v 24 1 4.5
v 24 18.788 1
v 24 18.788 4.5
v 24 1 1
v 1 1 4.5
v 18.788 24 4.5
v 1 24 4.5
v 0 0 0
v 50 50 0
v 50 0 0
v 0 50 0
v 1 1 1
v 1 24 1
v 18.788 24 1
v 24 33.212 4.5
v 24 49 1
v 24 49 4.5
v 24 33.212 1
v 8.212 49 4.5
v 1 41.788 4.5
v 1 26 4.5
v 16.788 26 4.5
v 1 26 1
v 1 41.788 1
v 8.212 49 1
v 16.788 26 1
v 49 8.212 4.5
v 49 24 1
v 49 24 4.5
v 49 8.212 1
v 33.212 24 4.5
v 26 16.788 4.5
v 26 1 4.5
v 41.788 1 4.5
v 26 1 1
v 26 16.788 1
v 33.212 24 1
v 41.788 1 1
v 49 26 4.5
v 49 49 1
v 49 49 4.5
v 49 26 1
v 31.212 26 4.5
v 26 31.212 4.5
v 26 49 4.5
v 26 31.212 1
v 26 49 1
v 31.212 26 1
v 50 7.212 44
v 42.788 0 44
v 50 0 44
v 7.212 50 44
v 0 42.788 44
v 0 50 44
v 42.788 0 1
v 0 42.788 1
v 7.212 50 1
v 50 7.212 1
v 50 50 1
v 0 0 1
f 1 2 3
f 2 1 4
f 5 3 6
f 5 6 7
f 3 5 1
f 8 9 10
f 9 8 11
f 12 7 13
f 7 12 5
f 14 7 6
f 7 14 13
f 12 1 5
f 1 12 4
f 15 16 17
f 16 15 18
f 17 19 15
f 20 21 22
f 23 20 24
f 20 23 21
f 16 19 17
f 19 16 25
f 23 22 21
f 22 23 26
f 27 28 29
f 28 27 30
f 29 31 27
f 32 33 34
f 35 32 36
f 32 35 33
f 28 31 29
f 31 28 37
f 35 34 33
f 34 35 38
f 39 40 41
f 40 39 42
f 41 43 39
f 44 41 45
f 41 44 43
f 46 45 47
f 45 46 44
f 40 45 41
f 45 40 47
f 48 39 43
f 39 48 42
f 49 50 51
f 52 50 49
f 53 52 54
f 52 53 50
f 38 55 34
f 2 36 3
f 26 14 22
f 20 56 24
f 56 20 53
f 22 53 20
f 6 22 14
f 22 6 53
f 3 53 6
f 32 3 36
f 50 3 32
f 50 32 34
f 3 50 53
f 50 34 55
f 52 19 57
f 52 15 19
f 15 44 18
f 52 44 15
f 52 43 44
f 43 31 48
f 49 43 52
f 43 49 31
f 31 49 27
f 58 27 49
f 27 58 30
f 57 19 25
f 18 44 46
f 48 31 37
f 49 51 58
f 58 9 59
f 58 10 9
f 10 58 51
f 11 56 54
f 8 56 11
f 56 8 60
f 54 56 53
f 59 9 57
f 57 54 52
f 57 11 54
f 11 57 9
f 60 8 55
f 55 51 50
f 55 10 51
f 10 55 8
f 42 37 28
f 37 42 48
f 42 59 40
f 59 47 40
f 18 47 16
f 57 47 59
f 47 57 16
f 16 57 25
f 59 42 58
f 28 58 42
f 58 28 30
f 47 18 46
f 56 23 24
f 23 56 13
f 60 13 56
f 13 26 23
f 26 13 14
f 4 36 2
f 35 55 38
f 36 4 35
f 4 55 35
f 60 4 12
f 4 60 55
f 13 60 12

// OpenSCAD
_basis = 25;

module diagonal_square(x=2, h=2) {
    color("LightGray") {
        for (i = [0:x-1]) {
            for (j = [0:x-1]) {
                translate([_basis*i+1,_basis*j+1,0]) cube([23,23,4.5]);
            }
        }
    }

    color("Grey") {
        cube([_basis*x,_basis*x,1]);
        intersection() {
            translate([_basis*x+sqrt(10.2*10.2*2)/2,0,0]) rotate([0,0,90+45]) cube([80,10.2,_basis*x-6]);
            cube([_basis*x,_basis*x,_basis*h]);
        }
    }
}

diagonal_square();
